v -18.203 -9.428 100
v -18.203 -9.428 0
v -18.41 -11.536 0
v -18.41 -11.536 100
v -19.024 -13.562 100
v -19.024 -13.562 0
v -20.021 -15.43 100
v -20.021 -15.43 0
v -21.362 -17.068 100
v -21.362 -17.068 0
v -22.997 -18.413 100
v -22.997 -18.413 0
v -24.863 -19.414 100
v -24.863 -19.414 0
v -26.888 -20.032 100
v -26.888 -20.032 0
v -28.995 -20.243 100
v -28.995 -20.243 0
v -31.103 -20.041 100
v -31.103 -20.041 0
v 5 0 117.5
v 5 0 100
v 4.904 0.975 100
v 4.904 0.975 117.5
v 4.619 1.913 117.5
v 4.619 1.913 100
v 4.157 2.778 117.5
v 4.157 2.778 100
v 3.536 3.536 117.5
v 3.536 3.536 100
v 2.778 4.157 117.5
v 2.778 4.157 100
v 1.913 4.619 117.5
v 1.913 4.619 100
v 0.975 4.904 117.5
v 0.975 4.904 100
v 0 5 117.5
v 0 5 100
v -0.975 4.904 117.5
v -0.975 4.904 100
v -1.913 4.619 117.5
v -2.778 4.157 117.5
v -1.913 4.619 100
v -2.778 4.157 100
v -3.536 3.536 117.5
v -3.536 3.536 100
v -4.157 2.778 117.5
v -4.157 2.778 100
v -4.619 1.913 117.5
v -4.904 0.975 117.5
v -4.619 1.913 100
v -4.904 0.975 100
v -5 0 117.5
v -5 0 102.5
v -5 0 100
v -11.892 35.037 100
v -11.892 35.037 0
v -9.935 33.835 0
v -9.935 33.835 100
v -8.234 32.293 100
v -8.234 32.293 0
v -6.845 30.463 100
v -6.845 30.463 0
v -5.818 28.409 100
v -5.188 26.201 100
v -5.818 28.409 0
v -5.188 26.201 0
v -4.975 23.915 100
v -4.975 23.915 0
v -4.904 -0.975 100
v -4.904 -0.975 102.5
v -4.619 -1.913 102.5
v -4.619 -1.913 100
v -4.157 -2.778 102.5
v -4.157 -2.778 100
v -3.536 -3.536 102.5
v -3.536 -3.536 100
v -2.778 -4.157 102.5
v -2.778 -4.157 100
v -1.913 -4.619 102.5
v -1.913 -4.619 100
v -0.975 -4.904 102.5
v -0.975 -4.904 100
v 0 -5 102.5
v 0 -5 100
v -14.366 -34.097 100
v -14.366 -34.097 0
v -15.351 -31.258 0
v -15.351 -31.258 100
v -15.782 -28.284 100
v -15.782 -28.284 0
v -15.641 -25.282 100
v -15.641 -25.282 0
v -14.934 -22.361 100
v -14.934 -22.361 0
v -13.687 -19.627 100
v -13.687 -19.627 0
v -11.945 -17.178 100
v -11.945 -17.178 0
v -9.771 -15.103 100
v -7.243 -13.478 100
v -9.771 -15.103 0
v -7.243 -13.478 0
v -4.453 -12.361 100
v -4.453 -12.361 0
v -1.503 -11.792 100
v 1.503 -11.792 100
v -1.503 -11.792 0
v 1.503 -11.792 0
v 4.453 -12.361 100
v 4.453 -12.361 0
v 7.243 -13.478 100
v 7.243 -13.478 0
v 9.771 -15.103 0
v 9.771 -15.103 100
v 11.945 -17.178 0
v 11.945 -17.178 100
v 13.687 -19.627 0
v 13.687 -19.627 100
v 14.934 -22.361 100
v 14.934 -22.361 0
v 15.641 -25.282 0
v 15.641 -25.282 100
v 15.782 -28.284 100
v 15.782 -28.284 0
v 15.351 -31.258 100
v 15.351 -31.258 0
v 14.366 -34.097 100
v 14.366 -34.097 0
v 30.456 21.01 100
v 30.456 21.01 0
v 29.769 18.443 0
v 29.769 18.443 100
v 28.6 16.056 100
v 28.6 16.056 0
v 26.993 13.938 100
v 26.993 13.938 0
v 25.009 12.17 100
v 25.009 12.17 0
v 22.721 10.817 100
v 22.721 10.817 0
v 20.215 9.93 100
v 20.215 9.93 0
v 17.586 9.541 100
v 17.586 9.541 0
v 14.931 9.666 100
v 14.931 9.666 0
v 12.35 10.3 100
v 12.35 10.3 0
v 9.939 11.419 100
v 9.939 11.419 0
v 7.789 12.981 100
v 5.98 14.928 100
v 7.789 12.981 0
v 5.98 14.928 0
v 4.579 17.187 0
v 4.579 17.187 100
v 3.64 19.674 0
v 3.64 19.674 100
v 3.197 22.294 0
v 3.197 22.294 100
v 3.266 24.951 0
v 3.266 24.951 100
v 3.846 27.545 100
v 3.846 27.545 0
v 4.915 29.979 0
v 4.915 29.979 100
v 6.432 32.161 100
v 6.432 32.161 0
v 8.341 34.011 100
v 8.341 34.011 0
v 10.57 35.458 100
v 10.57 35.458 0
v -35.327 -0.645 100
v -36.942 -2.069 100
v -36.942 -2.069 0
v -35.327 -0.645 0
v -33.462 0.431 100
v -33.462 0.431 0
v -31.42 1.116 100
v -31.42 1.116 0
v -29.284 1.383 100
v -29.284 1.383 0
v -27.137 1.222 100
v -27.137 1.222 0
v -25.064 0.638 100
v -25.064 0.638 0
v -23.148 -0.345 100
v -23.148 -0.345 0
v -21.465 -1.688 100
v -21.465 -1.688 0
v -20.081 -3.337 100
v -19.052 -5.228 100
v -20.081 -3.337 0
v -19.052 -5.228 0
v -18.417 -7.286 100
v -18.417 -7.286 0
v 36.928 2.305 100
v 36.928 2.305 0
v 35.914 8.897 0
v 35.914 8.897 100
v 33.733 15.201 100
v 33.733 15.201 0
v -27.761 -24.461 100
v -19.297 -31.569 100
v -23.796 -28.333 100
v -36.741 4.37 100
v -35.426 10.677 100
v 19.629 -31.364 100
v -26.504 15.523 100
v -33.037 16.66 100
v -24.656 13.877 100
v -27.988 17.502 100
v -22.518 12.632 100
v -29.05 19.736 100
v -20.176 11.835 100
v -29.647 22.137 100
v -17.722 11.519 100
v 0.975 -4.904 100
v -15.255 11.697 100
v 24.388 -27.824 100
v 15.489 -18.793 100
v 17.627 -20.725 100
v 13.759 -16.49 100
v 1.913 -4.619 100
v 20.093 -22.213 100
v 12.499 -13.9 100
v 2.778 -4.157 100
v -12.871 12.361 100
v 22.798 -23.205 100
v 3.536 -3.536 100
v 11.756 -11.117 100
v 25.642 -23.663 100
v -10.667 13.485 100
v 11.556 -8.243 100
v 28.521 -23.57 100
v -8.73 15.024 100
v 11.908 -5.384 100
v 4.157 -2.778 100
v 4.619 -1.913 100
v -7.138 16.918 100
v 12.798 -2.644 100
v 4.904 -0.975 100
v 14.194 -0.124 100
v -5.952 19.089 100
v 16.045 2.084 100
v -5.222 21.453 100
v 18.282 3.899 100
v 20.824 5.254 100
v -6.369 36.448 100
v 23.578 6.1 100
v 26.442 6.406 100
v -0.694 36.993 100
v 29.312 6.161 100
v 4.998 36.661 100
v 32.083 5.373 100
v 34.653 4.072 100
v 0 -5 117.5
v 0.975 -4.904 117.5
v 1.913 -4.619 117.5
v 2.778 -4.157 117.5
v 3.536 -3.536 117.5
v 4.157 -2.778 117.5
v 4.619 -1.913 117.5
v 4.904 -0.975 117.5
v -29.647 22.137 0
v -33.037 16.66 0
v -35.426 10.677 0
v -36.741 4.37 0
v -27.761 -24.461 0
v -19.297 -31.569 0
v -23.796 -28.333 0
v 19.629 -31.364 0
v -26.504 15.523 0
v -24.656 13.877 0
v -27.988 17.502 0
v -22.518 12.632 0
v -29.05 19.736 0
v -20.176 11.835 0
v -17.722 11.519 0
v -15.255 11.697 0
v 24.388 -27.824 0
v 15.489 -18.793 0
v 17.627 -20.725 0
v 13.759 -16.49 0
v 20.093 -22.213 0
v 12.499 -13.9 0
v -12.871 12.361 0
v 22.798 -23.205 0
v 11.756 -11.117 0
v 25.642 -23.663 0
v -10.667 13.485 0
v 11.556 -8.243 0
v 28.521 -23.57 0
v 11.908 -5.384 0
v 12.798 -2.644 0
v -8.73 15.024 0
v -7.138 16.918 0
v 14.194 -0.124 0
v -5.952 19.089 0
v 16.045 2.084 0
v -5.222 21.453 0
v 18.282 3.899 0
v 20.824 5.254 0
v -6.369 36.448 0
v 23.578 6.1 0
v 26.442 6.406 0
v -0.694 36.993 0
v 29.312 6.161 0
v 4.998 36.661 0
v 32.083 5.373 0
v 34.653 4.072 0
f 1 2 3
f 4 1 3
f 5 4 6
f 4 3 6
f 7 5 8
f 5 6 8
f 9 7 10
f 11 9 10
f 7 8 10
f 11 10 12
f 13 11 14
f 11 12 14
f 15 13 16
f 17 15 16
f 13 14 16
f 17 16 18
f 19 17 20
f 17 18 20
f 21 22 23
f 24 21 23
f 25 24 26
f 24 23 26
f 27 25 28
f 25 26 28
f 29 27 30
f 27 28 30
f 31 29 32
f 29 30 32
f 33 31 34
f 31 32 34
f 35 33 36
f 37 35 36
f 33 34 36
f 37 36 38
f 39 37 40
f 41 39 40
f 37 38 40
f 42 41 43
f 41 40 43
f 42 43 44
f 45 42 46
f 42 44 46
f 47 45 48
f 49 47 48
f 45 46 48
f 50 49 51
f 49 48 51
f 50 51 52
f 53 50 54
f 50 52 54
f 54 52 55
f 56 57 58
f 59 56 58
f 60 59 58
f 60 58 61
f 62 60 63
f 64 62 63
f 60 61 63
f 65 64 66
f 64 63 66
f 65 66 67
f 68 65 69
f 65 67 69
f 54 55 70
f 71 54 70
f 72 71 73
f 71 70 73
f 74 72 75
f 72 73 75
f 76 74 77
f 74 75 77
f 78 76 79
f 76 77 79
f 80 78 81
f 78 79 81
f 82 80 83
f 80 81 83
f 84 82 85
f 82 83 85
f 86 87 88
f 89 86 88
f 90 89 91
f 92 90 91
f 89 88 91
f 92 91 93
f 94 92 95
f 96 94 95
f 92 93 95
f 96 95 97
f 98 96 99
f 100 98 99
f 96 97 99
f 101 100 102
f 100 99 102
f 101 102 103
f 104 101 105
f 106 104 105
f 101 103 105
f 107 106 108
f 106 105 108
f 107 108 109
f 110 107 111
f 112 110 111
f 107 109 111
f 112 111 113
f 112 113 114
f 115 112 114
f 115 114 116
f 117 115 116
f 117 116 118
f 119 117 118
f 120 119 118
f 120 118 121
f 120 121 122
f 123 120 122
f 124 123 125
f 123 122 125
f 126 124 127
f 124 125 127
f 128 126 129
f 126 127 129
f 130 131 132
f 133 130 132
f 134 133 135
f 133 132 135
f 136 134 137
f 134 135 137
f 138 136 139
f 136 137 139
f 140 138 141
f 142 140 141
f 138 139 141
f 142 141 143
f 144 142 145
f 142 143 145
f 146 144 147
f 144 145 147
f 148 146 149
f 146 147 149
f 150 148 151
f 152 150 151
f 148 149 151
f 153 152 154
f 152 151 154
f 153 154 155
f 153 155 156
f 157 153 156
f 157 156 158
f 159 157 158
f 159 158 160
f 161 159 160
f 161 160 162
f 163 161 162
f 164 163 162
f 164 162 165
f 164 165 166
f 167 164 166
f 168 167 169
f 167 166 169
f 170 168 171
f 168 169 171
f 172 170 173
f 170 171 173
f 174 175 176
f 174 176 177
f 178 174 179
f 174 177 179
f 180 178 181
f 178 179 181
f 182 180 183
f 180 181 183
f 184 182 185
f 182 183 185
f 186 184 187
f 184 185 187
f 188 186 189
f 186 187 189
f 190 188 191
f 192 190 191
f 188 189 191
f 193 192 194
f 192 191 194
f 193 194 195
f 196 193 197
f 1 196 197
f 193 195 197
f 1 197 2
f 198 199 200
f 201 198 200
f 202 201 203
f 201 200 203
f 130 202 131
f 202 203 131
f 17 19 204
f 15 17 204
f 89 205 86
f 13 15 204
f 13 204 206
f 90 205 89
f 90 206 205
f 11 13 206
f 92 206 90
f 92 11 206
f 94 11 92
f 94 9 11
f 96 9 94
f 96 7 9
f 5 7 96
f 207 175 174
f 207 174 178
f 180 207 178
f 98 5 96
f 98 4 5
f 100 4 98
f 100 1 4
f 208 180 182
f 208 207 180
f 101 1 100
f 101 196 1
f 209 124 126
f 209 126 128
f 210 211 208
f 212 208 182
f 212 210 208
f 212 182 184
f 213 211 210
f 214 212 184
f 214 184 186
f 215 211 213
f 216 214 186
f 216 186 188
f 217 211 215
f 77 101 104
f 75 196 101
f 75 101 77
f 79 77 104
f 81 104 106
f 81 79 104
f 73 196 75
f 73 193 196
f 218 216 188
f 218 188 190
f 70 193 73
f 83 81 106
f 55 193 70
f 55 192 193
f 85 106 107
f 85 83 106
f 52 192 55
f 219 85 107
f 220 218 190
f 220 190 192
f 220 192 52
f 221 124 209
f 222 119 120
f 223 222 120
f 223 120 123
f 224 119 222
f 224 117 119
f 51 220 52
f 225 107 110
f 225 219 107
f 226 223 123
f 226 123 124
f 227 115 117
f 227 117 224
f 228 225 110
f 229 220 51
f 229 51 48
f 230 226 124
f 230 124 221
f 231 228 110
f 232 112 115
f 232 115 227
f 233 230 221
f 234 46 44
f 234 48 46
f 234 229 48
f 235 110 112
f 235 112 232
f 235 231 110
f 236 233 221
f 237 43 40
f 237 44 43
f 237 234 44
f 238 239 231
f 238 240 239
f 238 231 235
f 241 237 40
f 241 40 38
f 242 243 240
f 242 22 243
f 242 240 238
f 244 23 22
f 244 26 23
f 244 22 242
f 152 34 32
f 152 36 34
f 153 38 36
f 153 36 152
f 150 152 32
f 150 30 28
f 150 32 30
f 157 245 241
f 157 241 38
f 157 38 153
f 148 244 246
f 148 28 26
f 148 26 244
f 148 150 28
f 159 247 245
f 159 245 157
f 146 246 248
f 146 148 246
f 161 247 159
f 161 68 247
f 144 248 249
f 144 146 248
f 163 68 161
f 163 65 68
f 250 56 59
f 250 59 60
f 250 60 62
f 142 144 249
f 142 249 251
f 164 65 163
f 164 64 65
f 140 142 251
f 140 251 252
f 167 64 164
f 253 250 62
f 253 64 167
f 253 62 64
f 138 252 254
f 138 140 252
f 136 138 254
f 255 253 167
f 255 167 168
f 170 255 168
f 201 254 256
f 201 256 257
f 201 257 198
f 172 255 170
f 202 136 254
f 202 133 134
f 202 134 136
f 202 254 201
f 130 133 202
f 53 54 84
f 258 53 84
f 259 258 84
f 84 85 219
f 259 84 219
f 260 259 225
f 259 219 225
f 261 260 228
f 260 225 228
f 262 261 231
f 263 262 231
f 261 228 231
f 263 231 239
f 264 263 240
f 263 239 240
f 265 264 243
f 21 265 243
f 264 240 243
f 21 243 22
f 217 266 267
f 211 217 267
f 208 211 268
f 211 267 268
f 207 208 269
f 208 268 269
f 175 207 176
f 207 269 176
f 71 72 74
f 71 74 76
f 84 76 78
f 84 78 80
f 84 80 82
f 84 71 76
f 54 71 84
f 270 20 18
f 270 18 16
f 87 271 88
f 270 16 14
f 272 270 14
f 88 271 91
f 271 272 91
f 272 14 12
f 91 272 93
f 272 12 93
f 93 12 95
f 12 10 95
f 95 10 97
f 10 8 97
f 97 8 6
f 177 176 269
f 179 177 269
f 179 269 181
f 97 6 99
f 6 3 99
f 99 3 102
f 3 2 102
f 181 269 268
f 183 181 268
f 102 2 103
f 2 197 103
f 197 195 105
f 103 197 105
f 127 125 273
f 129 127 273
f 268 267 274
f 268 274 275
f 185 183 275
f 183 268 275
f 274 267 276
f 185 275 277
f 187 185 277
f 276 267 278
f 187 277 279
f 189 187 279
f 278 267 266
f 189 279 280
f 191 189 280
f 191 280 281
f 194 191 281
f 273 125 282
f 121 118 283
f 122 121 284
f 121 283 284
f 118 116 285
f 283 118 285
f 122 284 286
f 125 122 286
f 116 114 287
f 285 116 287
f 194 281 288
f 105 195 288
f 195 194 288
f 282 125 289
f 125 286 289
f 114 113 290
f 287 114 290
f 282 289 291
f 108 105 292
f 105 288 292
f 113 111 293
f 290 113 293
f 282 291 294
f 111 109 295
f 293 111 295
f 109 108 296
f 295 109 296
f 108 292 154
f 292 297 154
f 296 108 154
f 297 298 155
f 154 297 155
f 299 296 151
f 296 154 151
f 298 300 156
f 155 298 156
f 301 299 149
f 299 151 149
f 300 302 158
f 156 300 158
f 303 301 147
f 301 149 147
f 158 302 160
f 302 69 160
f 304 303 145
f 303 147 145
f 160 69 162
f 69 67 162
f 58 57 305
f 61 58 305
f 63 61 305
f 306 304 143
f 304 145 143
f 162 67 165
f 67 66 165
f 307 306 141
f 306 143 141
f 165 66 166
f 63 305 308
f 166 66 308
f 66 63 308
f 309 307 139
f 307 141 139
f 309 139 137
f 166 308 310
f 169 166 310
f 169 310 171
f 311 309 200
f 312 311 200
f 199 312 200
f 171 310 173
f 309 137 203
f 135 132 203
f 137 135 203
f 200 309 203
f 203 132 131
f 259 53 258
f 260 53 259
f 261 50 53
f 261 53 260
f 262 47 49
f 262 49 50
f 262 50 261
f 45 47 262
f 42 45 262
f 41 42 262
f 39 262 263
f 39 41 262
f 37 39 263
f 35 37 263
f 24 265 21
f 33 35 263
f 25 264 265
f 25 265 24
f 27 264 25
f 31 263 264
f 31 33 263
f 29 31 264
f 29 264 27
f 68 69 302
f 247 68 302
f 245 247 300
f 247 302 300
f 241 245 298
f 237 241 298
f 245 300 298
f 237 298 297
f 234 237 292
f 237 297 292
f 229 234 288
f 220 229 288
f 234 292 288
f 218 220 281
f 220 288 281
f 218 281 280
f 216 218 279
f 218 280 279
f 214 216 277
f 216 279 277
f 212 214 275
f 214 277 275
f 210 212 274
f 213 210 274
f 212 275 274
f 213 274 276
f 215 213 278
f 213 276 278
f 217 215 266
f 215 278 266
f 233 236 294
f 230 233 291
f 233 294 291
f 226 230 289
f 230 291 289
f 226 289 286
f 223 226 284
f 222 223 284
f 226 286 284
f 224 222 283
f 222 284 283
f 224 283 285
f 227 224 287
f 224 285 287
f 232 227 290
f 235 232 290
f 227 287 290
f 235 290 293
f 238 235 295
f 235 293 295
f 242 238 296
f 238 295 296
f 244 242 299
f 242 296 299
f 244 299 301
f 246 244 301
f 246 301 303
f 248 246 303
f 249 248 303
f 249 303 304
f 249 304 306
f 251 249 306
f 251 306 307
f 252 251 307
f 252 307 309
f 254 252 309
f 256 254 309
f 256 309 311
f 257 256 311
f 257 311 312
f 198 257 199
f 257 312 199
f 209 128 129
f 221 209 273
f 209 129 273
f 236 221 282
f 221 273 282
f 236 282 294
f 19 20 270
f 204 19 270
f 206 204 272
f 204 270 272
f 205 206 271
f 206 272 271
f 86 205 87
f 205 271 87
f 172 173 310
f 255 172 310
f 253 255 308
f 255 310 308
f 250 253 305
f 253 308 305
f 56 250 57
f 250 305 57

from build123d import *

# Parameters (mm, degrees)
F1_DEPTH = 100
F4_DEPTH = 17.5
F5_DEPTH = 2.5


with BuildPart() as f1:
    # F0 (on Top) → F1 (new body)
    with BuildSketch(Plane.XY):
        with BuildLine():
            ThreePointArc((28.5209304486, -23.5702466331), (12.2876501905, -3.9924995673), (36.9281607922, 2.3045477884))
            ThreePointArc((36.9281607922, 2.3045477884), (34.9662176525, 12.0980834464), (30.4561960313, 21.0100005546))
            ThreePointArc((30.4561960313, 21.0100005546), (8.8261833484, 12.1481991875), (10.5702157772, 35.4580109203))
            ThreePointArc((10.5702157772, 35.4580109203), (-0.6938621952, 36.9934934178), (-11.8924377724, 35.0366939626))
            ThreePointArc((-11.8924377724, 35.0366939626), (-6.8453800934, 30.4634762693), (-4.9749320578, 23.9145423537))
            ThreePointArc((-4.9749320578, 23.9145423537), (-16.4840155326, 11.5465890976), (-29.6469107264, 22.1373142992))
            ThreePointArc((-29.6469107264, 22.1373142992), (-35.4260679906, 10.6767835385), (-36.9421307963, -2.0685676756))
            ThreePointArc((-36.9421307963, -2.0685676756), (-25.064120667, 0.6380392173), (-18.2026853687, -9.4284175154))
            ThreePointArc((-18.2026853687, -9.4284175154), (-22.1469156931, -17.7804681058), (-31.1026851957, -20.0405332668))
            ThreePointArc((-31.1026851957, -20.0405332668), (-23.7959360481, -28.3329036209), (-14.3659429831, -34.0972093023))
            ThreePointArc((-14.3659429831, -34.0972093023), (-3.3658654806, -12.0826767357), (15.8, -27.52))
            ThreePointArc((15.8, -27.52), (15.4373232643, -30.8858654806), (14.3659429831, -34.0972093023))
            ThreePointArc((14.3659429831, -34.0972093023), (22.0799731419, -29.6896410563), (28.5209304486, -23.5702466331))
        make_face()
    extrude(amount=F1_DEPTH)

    # F3 (on offset) → F4 (join)
    with BuildSketch(Plane.XY.offset(100)):
        with BuildLine():
            ThreePointArc((0, -5), (3.5355339059, -3.5355339059), (5, 0))
            ThreePointArc((5, 0), (0, 5), (-5, 0))
            Line((-5, 0), (0, -5))
        make_face()
    extrude(amount=F4_DEPTH)

    # F3 (on offset) → F5 (join)
    with BuildSketch(Plane.XY.offset(100)):
        with BuildLine():
            Line((0, -5), (-5, 0))
            ThreePointArc((-5, 0), (-3.5355339059, -3.5355339059), (0, -5))
        make_face()
    extrude(amount=F5_DEPTH)


solid = f1.part
